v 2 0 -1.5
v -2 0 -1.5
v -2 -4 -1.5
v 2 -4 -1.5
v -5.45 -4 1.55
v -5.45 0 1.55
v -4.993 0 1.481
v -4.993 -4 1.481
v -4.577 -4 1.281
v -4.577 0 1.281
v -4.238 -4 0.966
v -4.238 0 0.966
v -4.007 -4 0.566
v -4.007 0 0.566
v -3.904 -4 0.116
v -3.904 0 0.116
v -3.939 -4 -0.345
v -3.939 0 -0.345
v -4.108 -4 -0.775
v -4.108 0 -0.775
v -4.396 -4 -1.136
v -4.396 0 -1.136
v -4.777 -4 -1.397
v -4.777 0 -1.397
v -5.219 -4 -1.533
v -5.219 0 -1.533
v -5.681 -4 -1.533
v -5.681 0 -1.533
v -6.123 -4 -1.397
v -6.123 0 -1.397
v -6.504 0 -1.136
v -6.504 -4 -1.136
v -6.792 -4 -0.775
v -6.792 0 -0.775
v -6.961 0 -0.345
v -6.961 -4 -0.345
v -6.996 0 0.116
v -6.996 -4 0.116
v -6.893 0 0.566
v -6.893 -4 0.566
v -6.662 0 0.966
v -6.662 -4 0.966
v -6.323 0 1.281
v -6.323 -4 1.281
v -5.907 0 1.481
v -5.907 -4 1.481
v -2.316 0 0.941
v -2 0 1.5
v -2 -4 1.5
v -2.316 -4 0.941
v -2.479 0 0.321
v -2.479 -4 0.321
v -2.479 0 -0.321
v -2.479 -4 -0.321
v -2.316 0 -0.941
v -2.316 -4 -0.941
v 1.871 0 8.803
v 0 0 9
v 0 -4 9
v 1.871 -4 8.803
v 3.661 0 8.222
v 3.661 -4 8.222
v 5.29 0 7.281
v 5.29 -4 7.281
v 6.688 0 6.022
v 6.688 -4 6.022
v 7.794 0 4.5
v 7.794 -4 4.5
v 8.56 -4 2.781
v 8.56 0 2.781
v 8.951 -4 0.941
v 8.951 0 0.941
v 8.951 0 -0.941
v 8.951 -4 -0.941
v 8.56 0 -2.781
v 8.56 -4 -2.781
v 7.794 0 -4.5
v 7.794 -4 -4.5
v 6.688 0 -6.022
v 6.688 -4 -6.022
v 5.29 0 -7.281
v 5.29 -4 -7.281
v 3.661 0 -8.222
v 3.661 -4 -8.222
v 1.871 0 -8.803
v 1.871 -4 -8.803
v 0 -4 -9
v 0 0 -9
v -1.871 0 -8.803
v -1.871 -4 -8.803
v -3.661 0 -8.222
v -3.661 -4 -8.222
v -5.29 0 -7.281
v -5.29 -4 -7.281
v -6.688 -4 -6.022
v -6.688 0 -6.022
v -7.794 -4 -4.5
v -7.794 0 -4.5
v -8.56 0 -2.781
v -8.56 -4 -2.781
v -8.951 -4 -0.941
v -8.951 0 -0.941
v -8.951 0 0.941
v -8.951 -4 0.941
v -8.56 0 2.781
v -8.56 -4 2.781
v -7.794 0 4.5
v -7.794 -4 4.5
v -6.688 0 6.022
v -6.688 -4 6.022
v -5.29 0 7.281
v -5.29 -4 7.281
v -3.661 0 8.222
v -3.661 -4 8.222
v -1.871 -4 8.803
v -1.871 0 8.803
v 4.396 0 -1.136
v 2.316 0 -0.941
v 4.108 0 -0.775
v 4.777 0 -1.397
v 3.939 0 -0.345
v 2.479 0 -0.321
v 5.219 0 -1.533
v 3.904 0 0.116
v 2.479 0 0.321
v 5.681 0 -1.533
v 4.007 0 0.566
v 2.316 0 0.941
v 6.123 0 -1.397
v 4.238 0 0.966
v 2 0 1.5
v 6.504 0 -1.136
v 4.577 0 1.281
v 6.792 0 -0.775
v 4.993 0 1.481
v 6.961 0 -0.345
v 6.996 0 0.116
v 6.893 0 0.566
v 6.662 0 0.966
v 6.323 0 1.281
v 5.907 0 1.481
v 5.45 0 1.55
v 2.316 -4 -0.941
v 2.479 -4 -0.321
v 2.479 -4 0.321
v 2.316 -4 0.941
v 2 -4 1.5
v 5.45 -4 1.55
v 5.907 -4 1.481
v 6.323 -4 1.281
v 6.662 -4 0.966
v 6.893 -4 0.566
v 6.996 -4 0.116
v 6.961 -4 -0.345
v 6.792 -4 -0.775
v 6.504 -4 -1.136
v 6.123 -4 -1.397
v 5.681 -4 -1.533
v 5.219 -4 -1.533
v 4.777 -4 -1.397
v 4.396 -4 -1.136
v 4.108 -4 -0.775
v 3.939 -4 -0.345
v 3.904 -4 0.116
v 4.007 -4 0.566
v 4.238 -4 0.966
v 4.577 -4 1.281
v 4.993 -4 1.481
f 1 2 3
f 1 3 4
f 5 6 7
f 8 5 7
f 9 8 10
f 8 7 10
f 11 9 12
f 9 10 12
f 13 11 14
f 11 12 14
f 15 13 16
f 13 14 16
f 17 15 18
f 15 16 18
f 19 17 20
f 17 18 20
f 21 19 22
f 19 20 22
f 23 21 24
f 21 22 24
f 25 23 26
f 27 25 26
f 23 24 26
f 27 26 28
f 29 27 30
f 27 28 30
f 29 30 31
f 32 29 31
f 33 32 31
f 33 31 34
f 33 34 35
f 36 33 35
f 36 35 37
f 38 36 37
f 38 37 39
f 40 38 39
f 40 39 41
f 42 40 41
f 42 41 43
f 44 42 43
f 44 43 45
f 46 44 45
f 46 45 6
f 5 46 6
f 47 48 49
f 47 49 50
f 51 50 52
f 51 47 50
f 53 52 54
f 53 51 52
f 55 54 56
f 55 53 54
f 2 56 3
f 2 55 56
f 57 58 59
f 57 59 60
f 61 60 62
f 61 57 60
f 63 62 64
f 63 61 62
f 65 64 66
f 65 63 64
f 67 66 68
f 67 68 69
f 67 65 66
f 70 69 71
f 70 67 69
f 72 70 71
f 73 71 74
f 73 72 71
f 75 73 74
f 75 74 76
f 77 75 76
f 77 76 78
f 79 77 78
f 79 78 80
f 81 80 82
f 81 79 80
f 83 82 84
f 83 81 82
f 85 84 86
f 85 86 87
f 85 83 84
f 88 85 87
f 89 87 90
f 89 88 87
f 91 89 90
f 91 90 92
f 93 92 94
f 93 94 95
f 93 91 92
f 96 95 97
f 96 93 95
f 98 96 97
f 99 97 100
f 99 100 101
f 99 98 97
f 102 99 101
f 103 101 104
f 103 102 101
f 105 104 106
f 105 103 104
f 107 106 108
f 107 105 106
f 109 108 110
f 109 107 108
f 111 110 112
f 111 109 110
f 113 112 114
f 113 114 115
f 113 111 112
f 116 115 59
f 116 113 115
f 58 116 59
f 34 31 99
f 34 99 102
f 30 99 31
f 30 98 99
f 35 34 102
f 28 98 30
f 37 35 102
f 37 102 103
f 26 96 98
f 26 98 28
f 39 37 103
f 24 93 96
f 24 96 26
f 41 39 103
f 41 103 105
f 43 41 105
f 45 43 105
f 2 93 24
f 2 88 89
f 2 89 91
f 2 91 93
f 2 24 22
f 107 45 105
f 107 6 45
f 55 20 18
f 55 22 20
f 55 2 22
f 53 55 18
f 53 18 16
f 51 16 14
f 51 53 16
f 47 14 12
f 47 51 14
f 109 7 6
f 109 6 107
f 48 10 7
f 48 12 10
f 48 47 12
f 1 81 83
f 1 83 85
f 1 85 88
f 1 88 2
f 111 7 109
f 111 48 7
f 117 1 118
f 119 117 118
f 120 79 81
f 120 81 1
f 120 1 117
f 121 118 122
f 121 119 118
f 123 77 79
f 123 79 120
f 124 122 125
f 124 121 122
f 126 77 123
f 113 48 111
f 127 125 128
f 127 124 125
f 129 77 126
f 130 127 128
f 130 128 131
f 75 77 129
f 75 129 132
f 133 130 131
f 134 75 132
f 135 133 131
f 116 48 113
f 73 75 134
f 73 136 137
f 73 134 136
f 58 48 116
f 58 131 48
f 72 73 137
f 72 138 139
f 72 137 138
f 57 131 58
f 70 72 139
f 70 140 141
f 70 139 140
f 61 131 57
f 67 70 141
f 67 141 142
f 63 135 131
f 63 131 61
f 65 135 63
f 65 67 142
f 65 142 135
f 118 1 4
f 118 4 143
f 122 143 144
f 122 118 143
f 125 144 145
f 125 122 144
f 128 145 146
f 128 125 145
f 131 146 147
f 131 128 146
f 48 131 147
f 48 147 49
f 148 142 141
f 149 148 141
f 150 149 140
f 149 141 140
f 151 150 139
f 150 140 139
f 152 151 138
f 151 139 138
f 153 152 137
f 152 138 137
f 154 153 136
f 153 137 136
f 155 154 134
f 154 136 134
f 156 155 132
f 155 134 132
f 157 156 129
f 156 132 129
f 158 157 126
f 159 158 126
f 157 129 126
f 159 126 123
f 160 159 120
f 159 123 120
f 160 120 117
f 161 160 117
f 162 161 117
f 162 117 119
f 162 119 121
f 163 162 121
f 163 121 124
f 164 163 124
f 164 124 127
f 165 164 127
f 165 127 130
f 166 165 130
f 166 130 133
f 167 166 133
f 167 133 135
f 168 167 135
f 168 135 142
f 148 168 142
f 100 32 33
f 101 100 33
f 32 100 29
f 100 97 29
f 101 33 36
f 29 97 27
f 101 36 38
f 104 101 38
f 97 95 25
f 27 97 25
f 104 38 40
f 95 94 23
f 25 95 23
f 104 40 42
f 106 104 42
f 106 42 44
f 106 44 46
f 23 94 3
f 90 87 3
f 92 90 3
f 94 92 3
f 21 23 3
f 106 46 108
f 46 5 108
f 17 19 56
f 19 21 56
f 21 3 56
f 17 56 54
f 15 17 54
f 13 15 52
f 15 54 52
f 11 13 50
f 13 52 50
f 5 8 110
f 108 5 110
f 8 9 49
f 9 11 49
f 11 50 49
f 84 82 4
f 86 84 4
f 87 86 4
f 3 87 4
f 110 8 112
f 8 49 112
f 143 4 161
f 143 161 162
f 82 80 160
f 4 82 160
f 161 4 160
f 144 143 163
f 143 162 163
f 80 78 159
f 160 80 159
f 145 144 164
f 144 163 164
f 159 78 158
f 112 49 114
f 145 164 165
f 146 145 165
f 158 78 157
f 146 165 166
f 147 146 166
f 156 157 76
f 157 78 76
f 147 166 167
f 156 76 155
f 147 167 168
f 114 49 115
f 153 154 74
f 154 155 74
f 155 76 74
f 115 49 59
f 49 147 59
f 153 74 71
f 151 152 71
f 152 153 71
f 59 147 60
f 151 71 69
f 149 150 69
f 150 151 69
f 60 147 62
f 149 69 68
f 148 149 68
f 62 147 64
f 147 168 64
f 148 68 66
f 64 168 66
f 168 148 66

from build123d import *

# Parameters (mm, degrees)
SKETCH1_R          = 9
BASE_FLANGE1_DEPTH = 4
CUT_EXTRUDE1_DEPTH = 10
SKETCH7_R          = 1.55
CUT_EXTRUDE2_DEPTH = 10


# Sheet-metal steps are written as plain solids
with BuildPart() as part:
    # Sketch1 → Base-Flange1 (new body)
    with BuildSketch(Plane(origin=(0, 0, 0), x_dir=(1, 0, 0), z_dir=(0, 1, 0))):
        with Locations(Location((0, 0, 0), (0, 0, 270))):
            Circle(SKETCH1_R)
    extrude(amount=-BASE_FLANGE1_DEPTH)

    # Sketch6 → Cut-Extrude1 (cut)
    with BuildSketch(Plane(origin=(0, 0, 0), x_dir=(1, 0, 0), z_dir=(0, 1, 0))):
        with BuildLine():
            Line((-2, 1.5), (2, 1.5))
            ThreePointArc((2, 1.5), (2.5, 0), (2, -1.5))
            Line((2, -1.5), (0, -1.5))
            Line((0, -1.5), (-2, -1.5))
            ThreePointArc((-2, -1.5), (-2.5, 0), (-2, 1.5))
        make_face()
    extrude(amount=-CUT_EXTRUDE1_DEPTH, mode=Mode.SUBTRACT)

    # Sketch7 → Cut-Extrude2 (cut)
    with BuildSketch(Plane(origin=(0, 0, 0), x_dir=(1, 0, 0), z_dir=(0, 1, 0))):
        with Locations(Location((-5.45, 0, 0), (0, 0, 270))):
            Circle(SKETCH7_R)
        with Locations(Location((5.45, 0, 0), (0, 0, 270))):
            Circle(SKETCH7_R)
    extrude(amount=-CUT_EXTRUDE2_DEPTH, mode=Mode.SUBTRACT)


solid = part.part
